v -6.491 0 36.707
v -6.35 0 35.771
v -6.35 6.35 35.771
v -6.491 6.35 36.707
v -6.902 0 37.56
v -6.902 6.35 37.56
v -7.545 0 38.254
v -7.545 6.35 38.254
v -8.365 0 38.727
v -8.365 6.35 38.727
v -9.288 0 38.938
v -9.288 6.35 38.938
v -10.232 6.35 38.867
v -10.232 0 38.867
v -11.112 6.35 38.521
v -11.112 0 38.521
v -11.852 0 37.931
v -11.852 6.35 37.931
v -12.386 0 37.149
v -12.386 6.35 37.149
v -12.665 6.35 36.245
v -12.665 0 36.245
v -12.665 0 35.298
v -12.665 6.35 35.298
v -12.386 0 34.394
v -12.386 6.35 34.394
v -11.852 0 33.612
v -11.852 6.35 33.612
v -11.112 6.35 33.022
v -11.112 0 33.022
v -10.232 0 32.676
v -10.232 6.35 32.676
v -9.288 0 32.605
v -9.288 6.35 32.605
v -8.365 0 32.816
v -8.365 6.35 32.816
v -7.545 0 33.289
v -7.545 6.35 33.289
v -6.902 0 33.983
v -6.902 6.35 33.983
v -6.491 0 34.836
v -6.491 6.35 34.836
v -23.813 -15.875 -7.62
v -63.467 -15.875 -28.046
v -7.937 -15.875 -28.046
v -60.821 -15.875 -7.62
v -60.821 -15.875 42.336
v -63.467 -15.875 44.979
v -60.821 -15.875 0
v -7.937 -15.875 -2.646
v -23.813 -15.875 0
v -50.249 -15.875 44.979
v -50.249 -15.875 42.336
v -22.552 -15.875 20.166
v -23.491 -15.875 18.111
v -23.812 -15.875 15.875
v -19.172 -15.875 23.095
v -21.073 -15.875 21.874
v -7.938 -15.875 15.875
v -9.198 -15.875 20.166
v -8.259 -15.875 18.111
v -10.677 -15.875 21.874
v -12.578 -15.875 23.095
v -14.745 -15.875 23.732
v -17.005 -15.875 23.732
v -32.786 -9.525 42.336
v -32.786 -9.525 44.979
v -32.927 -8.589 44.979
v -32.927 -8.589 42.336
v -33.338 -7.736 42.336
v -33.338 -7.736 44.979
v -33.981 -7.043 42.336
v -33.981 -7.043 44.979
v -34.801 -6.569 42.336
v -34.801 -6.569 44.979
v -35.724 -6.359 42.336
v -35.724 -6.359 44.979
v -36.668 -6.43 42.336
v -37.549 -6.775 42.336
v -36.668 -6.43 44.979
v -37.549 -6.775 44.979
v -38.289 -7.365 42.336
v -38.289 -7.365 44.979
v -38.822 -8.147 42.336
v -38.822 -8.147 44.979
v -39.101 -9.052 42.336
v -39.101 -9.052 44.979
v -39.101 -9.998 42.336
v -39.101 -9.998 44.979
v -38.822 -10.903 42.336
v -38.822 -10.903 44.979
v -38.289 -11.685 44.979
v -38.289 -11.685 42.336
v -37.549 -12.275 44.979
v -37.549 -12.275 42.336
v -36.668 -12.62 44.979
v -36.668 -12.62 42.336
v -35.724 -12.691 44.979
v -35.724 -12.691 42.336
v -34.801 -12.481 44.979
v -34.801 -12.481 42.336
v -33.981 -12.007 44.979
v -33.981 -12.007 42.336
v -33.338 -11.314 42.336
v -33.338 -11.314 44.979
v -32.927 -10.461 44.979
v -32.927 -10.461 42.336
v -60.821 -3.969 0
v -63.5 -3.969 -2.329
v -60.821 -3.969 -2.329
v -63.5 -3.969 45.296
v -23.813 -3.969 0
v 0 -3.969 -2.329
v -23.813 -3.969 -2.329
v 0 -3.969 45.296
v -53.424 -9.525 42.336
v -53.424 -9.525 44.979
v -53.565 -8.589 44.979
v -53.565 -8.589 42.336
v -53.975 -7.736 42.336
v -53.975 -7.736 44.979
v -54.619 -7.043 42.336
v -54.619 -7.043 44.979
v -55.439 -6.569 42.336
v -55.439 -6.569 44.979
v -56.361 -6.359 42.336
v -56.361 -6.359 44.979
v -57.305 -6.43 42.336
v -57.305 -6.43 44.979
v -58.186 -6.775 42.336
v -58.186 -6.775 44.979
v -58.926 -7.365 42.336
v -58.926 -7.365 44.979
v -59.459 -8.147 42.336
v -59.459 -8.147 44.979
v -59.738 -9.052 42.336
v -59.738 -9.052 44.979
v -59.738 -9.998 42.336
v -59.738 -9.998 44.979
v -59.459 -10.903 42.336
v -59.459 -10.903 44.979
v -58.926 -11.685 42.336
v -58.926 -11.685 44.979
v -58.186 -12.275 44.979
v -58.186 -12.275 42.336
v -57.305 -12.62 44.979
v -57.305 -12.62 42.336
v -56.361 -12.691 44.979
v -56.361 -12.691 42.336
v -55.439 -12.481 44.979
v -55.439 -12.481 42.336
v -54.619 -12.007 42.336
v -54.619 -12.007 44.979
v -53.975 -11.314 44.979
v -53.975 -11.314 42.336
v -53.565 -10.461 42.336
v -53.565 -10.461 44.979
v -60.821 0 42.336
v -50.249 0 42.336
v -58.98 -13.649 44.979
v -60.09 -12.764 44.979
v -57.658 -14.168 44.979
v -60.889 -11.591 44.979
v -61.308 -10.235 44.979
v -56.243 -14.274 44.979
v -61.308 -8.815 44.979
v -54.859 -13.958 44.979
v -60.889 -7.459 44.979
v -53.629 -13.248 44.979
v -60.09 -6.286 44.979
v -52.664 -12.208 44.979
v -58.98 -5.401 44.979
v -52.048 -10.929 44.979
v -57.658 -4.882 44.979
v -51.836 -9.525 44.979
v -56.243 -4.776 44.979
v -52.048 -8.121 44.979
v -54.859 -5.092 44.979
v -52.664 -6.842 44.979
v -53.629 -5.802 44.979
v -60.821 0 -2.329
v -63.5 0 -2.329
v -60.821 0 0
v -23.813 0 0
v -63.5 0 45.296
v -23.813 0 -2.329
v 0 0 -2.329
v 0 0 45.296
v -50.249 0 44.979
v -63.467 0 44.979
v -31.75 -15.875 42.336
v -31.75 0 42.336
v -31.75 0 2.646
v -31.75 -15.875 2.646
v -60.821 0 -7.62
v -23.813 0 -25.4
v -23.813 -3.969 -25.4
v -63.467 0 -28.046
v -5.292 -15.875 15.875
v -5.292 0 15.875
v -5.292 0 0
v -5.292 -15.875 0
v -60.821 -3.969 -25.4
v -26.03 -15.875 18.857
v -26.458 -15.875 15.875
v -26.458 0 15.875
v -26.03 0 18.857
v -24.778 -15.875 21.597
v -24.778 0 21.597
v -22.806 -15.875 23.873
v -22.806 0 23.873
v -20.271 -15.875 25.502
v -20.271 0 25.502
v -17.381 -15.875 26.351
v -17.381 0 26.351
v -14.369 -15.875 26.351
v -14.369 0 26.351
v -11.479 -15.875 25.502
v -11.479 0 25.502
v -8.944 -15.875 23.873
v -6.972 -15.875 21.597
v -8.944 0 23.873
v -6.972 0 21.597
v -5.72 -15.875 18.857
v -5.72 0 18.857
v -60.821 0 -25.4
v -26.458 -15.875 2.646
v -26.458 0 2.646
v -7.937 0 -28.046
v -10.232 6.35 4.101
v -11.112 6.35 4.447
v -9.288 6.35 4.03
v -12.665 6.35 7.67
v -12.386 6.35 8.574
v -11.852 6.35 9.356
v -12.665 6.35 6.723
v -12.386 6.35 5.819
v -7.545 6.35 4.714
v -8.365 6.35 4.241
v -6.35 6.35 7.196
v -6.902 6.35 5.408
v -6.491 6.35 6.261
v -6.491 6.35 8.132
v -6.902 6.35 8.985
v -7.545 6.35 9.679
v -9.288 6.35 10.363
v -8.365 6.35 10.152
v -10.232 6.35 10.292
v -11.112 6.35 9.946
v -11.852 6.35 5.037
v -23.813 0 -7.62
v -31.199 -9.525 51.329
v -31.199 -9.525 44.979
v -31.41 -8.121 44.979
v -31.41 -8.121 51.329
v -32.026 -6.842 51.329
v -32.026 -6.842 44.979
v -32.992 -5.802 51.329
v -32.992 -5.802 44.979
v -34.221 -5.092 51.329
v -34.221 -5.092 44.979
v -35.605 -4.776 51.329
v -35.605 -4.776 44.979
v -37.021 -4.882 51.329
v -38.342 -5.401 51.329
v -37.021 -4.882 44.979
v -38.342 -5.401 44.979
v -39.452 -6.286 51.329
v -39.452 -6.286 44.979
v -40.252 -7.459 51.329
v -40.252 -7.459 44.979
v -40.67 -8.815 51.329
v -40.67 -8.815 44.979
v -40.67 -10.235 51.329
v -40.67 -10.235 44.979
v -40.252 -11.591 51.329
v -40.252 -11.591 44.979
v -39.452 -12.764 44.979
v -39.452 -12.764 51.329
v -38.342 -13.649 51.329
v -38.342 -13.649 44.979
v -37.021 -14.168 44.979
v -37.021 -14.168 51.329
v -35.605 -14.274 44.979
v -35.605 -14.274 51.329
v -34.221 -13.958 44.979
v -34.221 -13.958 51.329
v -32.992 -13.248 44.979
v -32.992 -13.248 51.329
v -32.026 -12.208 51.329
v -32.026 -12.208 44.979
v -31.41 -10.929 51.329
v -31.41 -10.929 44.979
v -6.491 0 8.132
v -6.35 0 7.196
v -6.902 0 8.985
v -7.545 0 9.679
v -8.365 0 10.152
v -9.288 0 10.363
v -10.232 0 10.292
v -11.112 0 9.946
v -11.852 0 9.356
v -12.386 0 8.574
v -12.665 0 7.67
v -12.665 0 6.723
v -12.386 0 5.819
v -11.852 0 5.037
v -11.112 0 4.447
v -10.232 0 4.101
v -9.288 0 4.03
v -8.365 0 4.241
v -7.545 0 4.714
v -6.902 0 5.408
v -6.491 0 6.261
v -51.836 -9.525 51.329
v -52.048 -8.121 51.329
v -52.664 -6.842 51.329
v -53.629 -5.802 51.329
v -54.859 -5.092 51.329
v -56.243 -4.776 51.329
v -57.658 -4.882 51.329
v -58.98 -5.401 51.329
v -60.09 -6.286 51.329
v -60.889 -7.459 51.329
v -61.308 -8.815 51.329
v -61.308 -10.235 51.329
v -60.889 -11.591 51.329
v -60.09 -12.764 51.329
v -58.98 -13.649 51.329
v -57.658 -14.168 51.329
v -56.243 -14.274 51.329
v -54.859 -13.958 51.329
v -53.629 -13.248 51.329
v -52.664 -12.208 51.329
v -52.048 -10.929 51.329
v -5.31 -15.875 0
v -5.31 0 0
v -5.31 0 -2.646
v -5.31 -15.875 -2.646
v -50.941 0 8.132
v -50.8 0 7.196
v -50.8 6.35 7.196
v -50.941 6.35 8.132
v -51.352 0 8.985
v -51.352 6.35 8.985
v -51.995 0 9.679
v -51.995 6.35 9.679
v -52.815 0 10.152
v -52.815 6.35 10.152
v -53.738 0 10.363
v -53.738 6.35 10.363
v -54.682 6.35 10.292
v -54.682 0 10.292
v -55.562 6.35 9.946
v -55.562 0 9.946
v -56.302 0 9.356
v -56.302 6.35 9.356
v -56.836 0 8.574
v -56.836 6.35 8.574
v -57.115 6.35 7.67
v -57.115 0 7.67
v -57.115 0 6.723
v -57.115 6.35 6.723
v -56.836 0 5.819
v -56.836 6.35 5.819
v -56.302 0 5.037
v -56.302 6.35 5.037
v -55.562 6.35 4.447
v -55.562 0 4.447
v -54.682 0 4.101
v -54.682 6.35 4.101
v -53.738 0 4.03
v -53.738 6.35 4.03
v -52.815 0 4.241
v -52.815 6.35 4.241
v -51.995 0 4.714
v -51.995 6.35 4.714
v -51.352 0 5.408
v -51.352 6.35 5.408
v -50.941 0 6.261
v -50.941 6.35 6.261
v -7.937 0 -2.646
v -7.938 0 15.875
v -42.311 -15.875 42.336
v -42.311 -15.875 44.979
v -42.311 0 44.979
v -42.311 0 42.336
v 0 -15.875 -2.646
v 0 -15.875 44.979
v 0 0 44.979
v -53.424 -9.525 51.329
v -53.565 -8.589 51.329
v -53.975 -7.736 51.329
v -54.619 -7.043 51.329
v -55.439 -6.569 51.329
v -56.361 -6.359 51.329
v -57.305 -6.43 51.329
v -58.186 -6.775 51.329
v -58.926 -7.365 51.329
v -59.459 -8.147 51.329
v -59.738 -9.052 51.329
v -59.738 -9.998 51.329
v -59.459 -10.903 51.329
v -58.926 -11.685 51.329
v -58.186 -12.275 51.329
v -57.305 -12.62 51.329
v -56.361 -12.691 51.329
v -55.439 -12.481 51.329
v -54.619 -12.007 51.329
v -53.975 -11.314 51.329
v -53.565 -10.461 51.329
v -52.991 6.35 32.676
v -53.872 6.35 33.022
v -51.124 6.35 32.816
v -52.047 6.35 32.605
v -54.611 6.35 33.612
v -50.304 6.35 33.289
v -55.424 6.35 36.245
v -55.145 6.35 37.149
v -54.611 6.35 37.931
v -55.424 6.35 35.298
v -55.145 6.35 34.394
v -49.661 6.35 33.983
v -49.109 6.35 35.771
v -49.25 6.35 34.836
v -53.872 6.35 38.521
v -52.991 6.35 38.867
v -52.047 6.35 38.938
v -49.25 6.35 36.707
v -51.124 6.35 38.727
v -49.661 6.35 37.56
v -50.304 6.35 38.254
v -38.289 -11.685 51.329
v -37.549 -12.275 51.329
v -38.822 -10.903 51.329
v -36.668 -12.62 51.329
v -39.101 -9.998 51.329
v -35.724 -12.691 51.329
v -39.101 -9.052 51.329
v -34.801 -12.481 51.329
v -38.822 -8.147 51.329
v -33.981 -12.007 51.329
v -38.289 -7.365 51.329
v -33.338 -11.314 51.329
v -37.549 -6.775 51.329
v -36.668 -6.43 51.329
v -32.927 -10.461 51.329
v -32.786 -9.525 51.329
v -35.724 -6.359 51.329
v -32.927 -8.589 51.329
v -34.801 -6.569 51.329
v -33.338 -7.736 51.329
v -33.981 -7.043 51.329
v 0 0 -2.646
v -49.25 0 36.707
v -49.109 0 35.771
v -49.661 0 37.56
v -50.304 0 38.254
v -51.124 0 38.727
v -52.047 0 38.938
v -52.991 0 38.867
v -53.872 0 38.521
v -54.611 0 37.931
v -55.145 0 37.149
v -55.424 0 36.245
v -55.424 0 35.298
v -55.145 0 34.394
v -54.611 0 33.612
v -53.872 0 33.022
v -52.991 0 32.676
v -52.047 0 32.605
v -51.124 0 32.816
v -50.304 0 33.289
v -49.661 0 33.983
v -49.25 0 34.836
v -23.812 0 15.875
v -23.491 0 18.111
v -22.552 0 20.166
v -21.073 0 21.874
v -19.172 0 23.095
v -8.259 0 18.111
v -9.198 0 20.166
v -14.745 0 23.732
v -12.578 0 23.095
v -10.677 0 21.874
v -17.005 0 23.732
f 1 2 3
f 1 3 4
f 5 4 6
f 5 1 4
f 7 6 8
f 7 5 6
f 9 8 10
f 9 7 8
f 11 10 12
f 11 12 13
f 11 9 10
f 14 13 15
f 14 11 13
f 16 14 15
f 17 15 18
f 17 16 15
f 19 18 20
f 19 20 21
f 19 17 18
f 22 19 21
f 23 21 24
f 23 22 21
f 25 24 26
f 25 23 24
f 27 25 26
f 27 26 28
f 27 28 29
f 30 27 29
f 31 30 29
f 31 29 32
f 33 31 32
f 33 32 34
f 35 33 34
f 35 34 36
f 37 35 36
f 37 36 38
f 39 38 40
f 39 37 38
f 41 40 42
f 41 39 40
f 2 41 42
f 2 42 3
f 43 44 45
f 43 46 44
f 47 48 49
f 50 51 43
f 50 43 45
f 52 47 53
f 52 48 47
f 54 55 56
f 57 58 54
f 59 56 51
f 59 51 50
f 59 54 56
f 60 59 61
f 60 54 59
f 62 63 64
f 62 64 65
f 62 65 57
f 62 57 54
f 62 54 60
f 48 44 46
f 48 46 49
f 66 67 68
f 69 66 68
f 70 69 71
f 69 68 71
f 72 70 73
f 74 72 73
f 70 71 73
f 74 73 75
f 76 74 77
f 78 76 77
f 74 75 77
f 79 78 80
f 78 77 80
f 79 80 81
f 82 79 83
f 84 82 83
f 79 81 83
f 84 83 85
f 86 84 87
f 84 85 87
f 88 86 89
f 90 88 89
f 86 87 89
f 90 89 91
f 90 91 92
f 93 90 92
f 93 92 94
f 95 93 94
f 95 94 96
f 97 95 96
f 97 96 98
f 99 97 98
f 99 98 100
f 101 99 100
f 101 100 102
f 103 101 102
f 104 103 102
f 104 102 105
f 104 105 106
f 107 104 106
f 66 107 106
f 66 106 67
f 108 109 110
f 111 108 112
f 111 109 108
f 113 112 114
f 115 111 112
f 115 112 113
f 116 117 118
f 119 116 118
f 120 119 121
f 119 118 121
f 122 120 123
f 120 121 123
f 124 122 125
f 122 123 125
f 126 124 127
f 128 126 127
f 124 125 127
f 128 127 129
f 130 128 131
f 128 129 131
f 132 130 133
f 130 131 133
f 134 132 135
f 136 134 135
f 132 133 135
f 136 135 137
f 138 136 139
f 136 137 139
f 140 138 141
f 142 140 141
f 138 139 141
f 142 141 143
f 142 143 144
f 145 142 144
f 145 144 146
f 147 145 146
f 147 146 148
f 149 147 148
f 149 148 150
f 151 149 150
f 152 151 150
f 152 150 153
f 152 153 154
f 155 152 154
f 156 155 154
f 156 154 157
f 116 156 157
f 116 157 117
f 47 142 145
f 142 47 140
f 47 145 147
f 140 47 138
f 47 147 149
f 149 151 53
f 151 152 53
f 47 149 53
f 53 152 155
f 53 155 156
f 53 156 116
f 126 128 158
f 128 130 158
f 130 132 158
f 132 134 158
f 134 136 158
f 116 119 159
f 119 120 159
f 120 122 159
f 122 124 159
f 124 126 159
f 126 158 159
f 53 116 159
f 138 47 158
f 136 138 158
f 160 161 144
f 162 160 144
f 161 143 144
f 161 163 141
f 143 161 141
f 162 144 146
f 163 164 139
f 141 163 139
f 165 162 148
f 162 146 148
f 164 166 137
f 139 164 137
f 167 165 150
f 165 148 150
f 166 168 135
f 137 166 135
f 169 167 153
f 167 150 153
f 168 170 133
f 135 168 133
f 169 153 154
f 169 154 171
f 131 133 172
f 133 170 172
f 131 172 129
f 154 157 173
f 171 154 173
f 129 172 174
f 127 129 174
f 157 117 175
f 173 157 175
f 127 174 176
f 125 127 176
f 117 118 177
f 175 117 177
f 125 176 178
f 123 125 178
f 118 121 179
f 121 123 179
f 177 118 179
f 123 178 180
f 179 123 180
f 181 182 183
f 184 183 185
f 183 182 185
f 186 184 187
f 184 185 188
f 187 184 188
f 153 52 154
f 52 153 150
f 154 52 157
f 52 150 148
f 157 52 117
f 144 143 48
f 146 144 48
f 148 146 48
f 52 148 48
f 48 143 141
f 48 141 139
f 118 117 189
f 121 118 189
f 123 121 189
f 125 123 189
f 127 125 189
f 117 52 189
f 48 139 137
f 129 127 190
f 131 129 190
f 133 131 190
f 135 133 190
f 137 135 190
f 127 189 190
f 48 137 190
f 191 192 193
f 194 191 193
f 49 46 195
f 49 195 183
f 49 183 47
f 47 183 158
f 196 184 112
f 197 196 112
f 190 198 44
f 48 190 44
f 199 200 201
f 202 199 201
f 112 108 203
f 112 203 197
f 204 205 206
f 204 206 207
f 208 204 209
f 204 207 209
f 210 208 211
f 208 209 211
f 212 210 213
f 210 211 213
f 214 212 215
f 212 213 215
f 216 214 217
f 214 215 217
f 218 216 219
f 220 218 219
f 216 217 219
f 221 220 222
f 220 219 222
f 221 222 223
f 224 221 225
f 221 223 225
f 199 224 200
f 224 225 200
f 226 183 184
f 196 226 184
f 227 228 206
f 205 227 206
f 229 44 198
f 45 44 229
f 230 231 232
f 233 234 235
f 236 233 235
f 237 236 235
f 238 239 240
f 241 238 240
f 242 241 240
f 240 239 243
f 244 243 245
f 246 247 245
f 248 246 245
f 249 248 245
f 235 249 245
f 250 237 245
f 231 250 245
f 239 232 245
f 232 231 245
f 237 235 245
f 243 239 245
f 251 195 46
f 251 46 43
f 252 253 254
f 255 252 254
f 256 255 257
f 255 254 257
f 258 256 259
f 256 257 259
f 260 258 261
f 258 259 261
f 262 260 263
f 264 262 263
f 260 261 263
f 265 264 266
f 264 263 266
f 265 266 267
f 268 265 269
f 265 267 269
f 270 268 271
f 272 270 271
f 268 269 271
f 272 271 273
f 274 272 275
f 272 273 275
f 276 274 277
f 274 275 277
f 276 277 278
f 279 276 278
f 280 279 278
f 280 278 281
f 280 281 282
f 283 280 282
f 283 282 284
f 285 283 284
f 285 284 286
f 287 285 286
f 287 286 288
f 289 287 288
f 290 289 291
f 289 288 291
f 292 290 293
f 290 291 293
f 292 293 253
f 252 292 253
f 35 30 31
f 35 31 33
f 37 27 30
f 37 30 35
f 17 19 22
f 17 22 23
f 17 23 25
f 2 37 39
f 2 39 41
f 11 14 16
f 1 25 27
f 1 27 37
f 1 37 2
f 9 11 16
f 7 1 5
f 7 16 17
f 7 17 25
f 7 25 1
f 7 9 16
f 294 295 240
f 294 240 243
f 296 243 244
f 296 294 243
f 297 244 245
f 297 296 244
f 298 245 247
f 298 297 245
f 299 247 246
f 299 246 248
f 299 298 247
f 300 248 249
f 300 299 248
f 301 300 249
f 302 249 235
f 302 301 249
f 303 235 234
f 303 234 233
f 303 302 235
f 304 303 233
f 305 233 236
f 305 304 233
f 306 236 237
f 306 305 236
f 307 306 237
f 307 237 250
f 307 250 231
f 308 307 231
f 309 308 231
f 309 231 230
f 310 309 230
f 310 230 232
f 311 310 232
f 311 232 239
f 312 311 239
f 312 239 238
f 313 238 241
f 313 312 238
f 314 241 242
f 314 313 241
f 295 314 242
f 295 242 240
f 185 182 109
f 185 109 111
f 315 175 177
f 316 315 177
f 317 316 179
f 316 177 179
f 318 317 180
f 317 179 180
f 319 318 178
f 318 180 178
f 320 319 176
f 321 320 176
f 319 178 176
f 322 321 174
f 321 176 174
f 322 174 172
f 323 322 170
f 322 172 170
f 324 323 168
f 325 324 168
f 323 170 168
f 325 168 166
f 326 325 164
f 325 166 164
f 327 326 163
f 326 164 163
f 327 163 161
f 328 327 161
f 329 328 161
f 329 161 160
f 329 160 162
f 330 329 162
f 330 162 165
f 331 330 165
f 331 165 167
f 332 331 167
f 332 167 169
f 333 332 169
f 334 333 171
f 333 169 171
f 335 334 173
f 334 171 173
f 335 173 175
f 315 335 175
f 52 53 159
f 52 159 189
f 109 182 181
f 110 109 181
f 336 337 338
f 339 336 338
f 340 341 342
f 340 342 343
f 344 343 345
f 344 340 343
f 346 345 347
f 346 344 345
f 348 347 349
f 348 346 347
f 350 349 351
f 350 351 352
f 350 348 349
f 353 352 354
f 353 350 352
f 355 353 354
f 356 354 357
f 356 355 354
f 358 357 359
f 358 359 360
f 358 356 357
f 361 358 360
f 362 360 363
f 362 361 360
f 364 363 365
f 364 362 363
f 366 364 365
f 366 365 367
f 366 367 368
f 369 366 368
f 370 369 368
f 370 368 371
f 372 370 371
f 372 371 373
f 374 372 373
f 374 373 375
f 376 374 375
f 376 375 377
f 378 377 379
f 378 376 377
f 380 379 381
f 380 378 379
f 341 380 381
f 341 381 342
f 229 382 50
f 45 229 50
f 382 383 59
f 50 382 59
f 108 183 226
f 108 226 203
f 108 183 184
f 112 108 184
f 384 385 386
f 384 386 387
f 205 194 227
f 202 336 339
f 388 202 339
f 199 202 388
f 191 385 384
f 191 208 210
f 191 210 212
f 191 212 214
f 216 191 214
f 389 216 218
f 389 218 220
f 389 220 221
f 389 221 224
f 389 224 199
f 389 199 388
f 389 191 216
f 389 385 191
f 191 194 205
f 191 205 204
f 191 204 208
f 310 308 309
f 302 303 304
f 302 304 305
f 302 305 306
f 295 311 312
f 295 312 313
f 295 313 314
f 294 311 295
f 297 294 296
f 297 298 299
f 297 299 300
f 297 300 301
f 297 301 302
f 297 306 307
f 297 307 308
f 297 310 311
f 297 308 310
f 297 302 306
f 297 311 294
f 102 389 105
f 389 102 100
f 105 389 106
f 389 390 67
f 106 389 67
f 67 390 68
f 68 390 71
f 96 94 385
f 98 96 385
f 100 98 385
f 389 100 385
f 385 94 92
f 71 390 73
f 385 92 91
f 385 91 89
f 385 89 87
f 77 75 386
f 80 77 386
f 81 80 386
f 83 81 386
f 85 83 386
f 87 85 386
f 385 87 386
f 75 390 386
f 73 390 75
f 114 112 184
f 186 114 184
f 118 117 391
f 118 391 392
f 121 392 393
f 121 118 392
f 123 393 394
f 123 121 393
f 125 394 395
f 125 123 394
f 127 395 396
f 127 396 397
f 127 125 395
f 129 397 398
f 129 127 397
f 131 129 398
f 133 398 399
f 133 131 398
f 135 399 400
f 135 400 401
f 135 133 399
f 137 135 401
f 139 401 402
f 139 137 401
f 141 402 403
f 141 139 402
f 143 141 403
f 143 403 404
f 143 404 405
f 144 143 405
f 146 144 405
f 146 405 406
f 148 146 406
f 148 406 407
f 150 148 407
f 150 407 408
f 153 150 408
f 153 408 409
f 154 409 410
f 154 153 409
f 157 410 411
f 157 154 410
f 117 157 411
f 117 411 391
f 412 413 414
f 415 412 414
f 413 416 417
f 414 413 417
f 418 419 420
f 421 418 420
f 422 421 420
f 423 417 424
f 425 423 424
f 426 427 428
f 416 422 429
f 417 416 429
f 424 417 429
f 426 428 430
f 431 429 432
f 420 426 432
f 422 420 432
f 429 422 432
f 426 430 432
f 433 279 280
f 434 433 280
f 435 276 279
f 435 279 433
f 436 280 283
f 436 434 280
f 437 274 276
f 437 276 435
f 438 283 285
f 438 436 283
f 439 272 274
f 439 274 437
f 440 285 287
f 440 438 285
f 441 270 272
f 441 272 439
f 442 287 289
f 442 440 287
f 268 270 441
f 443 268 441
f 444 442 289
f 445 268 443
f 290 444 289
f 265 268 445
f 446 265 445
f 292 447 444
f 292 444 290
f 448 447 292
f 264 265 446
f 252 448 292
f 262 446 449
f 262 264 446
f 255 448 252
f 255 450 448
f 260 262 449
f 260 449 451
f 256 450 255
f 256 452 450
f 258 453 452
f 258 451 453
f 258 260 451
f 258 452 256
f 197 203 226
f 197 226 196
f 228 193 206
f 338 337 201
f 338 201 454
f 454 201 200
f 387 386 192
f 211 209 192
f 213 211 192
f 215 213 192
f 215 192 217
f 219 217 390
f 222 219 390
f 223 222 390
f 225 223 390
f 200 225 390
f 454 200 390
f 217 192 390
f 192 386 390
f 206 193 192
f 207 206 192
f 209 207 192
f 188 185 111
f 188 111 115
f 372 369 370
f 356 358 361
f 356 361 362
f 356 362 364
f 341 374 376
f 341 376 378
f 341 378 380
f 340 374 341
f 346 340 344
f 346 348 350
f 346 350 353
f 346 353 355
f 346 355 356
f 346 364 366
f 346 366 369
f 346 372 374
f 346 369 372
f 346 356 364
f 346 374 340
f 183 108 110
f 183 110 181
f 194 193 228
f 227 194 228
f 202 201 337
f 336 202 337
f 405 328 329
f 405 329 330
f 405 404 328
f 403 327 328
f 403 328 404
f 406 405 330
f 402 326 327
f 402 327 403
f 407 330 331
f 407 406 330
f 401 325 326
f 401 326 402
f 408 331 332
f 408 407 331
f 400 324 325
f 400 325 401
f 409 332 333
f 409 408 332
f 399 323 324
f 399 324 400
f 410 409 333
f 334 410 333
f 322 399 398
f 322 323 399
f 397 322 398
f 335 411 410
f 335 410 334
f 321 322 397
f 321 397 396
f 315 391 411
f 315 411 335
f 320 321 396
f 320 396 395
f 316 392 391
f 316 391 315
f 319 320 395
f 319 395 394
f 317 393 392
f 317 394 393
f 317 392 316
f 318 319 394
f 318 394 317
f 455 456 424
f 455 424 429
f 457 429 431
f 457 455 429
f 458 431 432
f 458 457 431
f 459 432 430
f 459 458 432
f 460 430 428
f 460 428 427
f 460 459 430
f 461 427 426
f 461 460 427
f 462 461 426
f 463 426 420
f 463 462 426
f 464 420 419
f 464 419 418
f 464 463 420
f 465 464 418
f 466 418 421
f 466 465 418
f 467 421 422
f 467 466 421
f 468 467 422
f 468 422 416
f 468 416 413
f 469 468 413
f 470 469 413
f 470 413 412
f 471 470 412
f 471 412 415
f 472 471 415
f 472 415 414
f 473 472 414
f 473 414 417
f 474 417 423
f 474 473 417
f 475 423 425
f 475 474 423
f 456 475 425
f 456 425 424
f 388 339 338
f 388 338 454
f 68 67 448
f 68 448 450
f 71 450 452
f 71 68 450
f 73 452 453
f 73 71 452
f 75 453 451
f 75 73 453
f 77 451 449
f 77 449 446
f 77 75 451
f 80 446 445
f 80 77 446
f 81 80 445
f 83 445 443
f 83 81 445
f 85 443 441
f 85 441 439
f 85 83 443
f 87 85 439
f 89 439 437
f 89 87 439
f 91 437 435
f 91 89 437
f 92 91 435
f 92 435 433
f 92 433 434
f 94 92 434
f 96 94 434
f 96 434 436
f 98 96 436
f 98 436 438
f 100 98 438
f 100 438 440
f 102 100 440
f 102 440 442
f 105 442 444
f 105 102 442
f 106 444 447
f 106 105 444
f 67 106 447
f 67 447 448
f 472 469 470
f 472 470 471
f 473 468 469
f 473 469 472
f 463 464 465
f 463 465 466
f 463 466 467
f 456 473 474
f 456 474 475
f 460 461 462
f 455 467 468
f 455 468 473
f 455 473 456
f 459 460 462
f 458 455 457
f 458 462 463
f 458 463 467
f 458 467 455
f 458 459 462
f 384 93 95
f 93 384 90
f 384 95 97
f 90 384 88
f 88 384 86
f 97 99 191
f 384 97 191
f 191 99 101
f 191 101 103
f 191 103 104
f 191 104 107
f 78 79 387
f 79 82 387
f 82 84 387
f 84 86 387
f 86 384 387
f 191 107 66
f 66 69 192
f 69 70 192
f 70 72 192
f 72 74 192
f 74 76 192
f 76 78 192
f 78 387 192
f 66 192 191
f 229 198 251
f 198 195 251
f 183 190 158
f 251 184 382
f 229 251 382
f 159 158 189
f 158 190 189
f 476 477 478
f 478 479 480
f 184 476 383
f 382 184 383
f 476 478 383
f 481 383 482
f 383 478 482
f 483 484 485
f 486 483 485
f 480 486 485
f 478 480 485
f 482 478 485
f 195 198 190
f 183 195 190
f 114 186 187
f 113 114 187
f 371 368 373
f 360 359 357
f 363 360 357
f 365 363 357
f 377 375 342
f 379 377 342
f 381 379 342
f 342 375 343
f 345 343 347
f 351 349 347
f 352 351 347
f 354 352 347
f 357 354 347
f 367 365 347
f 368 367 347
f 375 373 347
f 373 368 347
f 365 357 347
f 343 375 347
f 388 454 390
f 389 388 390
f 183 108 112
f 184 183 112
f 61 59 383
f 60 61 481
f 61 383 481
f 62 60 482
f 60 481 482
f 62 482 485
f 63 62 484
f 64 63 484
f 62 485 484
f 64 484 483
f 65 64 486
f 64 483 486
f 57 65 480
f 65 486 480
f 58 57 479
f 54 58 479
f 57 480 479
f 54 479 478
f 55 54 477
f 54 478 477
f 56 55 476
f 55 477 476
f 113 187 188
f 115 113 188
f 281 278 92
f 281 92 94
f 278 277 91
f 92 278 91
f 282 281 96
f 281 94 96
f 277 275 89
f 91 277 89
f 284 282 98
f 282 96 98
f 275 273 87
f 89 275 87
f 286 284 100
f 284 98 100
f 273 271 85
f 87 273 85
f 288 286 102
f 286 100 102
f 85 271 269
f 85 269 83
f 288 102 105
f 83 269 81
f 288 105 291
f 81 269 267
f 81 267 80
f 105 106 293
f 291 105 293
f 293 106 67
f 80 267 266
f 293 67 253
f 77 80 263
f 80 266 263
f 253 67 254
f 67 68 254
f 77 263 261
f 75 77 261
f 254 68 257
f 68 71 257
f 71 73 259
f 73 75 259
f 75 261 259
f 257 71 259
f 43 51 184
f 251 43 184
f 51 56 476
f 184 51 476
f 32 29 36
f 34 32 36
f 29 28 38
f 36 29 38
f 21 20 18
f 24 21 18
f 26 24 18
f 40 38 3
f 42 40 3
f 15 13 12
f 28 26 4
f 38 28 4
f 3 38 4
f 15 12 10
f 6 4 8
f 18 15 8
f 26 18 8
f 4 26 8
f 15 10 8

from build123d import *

# Parameters (mm, degrees)
F1_DEPTH  = 15.875
F0_W      = 2.6458333332
F0_H      = 42.3358732487
F2_W      = 63.5
F2_H      = 47.625
F2_R      = 3.175
F3_DEPTH  = 3.96875
F4_DEPTH  = 6.35
F5_R      = 4.7625
F5_R_2    = 3.175
F6_DEPTH  = 6.35
F7_R      = 3.175
F8_DEPTH  = 25.4
F9_W      = 55.5296598673
F9_H      = 15.875
F10_DEPTH = 25.4
F11_W     = 37.0088265341
F11_H     = 15.875
F12_DEPTH = 7.62
F13_W     = 37.0088265341
F13_H     = 3.96875
F14_DEPTH = 25.4


# Not quite as in the source:
# - a feature names something its author has since deleted; it is built from what else it names


with BuildPart() as f1:
    # F0 (on Front) → F1 (new body)
    with BuildSketch(Plane.XZ):
        with BuildLine():
            Line((0, 44.979166582), (-31.75, 44.979166582))
            Line((-31.75, 44.979166582), (-31.75, 42.3358732487))
            Line((-31.75, 42.3358732487), (-31.75, 2.6458333332))
            Line((-31.75, 2.6458333332), (-26.4583333333, 2.6458333332))
            Line((-26.4583333333, 2.6458333332), (-26.4583333333, 15.875))
            ThreePointArc((-26.4583333333, 15.875), (-15.875, 26.4583333333), (-5.2916666667, 15.875))
            Line((-5.2916666667, 15.875), (-5.2916666667, 0))
            Line((-5.2916666667, 0), (0, 0))
            Line((0, 0), (0, 44.979166582))
        make_face()
        Polygon((0, -2.6458333333), (0, 0), (-5.2916666667, 0), (-5.309548229, 0), (-5.309548229, -2.6458333333), align=None)
        Polygon((-31.75, 42.3358732487), (-31.75, 44.979166582), (-34.3958333316, 44.979166582), (-37.0416664956, 44.979166582), (-42.3110765377, 44.979166582), (-42.3110765377, 42.3358732487), (-37.0416664956, 42.3358732487), (-34.3958333316, 42.3358732487), align=None)
    extrude(amount=F1_DEPTH)


with BuildPart() as f1b:
    # F0 (on Front) → F1, piece 2 (new body)
    with BuildSketch(Plane.XZ):
        with BuildLine():
            Line((-23.8125, 0), (-7.9375, 0))
            Line((-7.9375, 0), (-7.9375, 15.875))
            ThreePointArc((-7.9375, 15.875), (-15.875, 23.8125), (-23.8125, 15.875))
            Line((-23.8125, 15.875), (-23.8125, 0))
        make_face()
        Polygon((-26.4583333333, 0), (-31.75, 0), (-60.8213265341, 0), (-63.4671598673, 0), (-63.4671598673, -2.6458333333), (-7.9375, -2.6458333333), (-7.9375, 0), (-23.8125, 0), align=None)
        with Locations((-62.1442432007, 21.1679366243)):
            Rectangle(F0_W, F0_H)
        Polygon((-50.2485765377, 42.3358732487), (-50.2485765377, 44.979166582), (-55.5296598693, 44.979166582), (-58.175493201, 44.979166582), (-63.4671598673, 44.979166582), (-63.4671598673, 42.3358732487), (-60.8213265341, 42.3358732487), (-58.175493201, 42.3358732487), (-55.5296598693, 42.3358732487), align=None)
    extrude(amount=F1_DEPTH)


with BuildPart() as f3:
    # F2 (on Front) → F3 (new body)
    with BuildSketch(Plane.XZ):
        with Locations((-31.75, 21.4839725468)):
            Rectangle(F2_W, F2_H)
        with Locations((-53.975, 7.1964725468)):
            Circle(F2_R, mode=Mode.SUBTRACT)
        with Locations((-9.525, 7.1964725468)):
            Circle(F2_R, mode=Mode.SUBTRACT)
        with Locations((-52.284011212, 35.7714725468)):
            Circle(F2_R, mode=Mode.SUBTRACT)
        with Locations((-9.525, 35.7714725468)):
            Circle(F2_R, mode=Mode.SUBTRACT)
        with Locations((-52.284011212, 35.7714725468)):
            Circle(F2_R)
        with Locations((-53.975, 7.1964725468)):
            Circle(F2_R)
        with Locations((-9.525, 7.1964725468)):
            Circle(F2_R)
        with Locations((-9.525, 35.7714725468)):
            Circle(F2_R)
    extrude(amount=F3_DEPTH)


with BuildPart() as f4:
    # F2 (on Front) → F4 (new body)
    with BuildSketch(Plane.XZ):
        with Locations((-9.525, 35.7714725468)):
            Circle(F2_R)
    extrude(amount=-F4_DEPTH)


with BuildPart() as f4b:
    # F2 (on Front) → F4, piece 2 (new body)
    with BuildSketch(Plane.XZ):
        with Locations((-52.284011212, 35.7714725468)):
            Circle(F2_R)
    extrude(amount=-F4_DEPTH)


with BuildPart() as f4c:
    # F2 (on Front) → F4, piece 3 (new body)
    with BuildSketch(Plane.XZ):
        with Locations((-9.525, 7.1964725468)):
            Circle(F2_R)
    extrude(amount=-F4_DEPTH)


with BuildPart() as f4d:
    # F2 (on Front) → F4, piece 4 (new body)
    with BuildSketch(Plane.XZ):
        with Locations((-53.975, 7.1964725468)):
            Circle(F2_R)
    extrude(amount=-F4_DEPTH)


with BuildPart() as f6:
    # F5 (on face) → F6 (new body)
    with BuildSketch(Plane.XY.offset(44.979166582)):
        with Locations((-56.5985765377, -9.525)):
            Circle(F5_R)
        with Locations((-56.5985765377, -9.525)):
            Circle(F5_R_2, mode=Mode.SUBTRACT)
    extrude(amount=F6_DEPTH)


with BuildPart() as f6b:
    # F5 (on face) → F6, piece 2 (new body)
    with BuildSketch(Plane.XY.offset(44.979166582)):
        with Locations((-35.9610765377, -9.525)):
            Circle(F5_R)
        with Locations((-35.9610765377, -9.525)):
            Circle(F5_R_2, mode=Mode.SUBTRACT)
    extrude(amount=F6_DEPTH)


with BuildPart() as f8_tool:
    # F7 (on face) → F8 (new body)
    with BuildSketch(Plane.XY.offset(44.979166582)):
        with Locations((-35.9610765377, -9.525)):
            Circle(F7_R)
        with Locations((-56.5985765377, -9.525)):
            Circle(F7_R)
    extrude(amount=-F8_DEPTH)


with BuildPart() as f1_1:
    add(f1.part)

    # F8: cut by f8_tool
    add(f8_tool.part, mode=Mode.SUBTRACT)


with BuildPart() as f1b_1:
    add(f1b.part)

    # F8: cut by f8_tool
    add(f8_tool.part, mode=Mode.SUBTRACT)

    # F9 (on face) → F10 (join)
    with BuildSketch(Plane(origin=(0, 0, -2.6458333333), x_dir=(1, 0, 0), z_dir=(0, 0, -1))):
        with Locations((-35.7023299336, 7.9375)):
            Rectangle(F9_W, F9_H)
    extrude(amount=F10_DEPTH)


with BuildPart() as f12_tool:
    # F11 (on face) → F12 (new body)
    with BuildSketch(Plane.XY):
        with Locations((-42.3169132671, -7.9375)):
            Rectangle(F11_W, F11_H)
    extrude(amount=-F12_DEPTH)


with BuildPart() as f1b_2:
    add(f1b_1.part)

    # F12: cut by f12_tool
    add(f12_tool.part, mode=Mode.SUBTRACT)


with BuildPart() as f3_1:
    add(f3.part)

    # F12: cut by f12_tool
    add(f12_tool.part, mode=Mode.SUBTRACT)


with BuildPart() as f14:
    # F13 (on face) → F14 (new body)
    with BuildSketch(Plane(origin=(0, 0, 0), x_dir=(1, 0, 0), z_dir=(0, 0, -1))):
        with Locations((-42.3169132671, 1.984375)):
            Rectangle(F13_W, F13_H)
    extrude(amount=F14_DEPTH)


solid = Compound([f4.part, f4b.part, f4c.part, f4d.part, f6.part, f6b.part, f1_1.part, f1b_2.part, f3_1.part, f14.part])
